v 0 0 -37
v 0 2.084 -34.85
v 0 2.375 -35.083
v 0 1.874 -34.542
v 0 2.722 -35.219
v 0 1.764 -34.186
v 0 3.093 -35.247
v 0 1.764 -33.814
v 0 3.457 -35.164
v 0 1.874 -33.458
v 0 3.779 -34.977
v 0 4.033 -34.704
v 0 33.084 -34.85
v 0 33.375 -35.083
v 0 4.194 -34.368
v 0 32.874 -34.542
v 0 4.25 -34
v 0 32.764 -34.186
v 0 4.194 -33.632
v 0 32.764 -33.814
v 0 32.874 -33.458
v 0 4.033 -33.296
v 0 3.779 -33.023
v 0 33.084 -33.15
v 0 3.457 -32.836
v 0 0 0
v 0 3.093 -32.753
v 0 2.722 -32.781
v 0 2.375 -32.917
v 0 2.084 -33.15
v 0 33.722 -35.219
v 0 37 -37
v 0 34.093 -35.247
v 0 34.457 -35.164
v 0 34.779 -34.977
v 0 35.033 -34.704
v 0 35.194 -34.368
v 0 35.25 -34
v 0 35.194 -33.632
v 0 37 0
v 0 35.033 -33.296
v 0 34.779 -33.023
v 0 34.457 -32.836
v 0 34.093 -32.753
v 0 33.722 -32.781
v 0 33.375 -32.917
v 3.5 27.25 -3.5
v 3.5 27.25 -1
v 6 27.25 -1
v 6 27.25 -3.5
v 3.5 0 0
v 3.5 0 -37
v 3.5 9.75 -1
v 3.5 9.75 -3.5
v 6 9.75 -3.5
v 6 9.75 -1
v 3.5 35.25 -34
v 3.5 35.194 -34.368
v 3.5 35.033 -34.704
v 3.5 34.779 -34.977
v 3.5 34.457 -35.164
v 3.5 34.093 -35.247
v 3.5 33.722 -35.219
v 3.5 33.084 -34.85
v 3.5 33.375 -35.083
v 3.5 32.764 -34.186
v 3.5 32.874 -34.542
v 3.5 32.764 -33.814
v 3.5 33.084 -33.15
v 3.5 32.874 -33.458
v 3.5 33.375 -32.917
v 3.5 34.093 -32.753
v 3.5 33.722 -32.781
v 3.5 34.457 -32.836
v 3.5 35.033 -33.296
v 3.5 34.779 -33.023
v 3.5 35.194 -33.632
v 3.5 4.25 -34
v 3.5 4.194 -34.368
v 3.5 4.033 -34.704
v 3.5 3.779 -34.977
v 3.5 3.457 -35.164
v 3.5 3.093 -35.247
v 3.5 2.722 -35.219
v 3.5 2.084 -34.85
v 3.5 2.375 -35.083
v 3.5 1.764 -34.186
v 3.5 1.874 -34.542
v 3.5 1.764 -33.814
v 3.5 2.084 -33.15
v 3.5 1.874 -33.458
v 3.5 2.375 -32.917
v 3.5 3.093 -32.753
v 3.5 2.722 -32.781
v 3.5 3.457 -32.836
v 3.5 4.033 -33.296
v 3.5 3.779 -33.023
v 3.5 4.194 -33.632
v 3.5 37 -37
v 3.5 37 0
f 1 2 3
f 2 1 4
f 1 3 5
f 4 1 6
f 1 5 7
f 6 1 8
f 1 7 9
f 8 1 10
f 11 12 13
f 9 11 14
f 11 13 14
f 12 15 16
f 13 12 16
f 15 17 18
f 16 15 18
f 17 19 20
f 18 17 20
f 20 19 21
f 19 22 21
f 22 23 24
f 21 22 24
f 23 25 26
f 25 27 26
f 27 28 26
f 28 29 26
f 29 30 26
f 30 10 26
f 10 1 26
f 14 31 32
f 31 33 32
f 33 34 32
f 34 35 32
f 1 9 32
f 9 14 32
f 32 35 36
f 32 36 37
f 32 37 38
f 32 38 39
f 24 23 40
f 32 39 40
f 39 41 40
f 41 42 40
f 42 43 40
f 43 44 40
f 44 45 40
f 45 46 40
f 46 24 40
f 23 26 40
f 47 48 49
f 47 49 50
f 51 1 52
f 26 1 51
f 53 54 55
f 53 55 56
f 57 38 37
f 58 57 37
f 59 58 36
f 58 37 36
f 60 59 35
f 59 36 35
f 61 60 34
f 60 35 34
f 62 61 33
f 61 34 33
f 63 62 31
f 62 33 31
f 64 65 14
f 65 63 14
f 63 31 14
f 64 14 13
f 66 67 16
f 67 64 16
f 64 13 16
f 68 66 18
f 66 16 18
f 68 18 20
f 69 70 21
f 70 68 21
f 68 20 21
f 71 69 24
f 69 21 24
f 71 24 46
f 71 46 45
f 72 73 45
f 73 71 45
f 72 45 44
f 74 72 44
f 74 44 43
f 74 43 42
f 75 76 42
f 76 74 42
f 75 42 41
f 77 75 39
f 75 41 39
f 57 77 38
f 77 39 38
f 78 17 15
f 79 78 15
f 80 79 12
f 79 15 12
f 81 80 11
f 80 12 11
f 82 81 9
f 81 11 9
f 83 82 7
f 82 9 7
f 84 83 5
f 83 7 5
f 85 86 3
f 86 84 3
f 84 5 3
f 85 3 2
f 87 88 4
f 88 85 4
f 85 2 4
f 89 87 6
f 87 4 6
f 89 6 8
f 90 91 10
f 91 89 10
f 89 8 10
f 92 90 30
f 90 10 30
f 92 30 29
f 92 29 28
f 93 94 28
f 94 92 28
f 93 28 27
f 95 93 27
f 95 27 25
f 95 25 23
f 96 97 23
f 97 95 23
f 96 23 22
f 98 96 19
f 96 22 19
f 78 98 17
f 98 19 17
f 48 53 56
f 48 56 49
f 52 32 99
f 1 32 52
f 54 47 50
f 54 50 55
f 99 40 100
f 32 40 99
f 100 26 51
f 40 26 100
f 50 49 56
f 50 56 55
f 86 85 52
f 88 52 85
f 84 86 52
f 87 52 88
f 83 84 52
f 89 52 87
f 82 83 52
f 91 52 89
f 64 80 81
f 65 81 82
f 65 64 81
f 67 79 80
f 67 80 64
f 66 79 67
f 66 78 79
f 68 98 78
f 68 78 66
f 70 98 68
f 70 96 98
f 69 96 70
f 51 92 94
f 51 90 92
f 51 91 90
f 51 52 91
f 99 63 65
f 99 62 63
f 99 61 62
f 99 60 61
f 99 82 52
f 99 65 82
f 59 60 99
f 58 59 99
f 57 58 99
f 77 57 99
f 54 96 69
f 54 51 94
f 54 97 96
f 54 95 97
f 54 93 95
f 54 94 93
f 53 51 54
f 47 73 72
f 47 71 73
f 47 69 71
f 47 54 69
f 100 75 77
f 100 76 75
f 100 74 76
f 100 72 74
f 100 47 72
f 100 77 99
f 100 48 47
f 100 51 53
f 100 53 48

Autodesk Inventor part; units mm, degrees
ref_plane "YZ Plane" through (0, 0, 0) normal (1, 0, 0) x (0, 1, 0)
ref_plane "XZ Plane" through (0, 0, 0) normal (0, 1, 0) x (-1, 0, 0)
ref_plane "XY Plane" through (0, 0, 0) normal (0, 0, 1) x (1, 0, 0)
sketch "Náčrt1" plane through (0, 0, 0) normal (1, 0, 0) x (0, 1, 0)
  line L0 (0, 0) -> (37, 0)
  line L1 (37, 0) -> (37, -37)
  line L2 (37, -37) -> (0, -37)
  line L3 (0, -37) -> (0, 0)
  circle A0 centre (34, -34) radius 1.25
  circle A1 centre (3, -34) radius 1.25
  dimension "d0" = 37
  dimension "d1" = 37
  dimension "d2" = 2.5
  dimension "d3" = 3
  dimension "d4" = 3
  dimension "d5" = 3
extrude "Vysunutí1" add sketch "Náčrt1" along normal blind 3.5
sketch "Náčrt2" plane through (3.5, 0, 0) normal (1, 0, 0) x (0, 0, -1)
  line L0 (1, 27.25) -> (3.5, 27.25)
  line L1 (3.5, 27.25) -> (3.5, 9.75)
  line L2 (3.5, 9.75) -> (1, 9.75)
  line L3 (1, 9.75) -> (1, 27.25)
  line L4 (0, 37) -> (37, 37) projected
  line L5 (0, 37) -> (0, 0) projected
  dimension "d8" = 2.5
  dimension "d9" = 17.5
  dimension "d10" = 9.75
  dimension "d11" = 1
extrude "Vysunutí2" add sketch "Náčrt2" along normal blind 2.5
equation "\"d1\" = d0"
equation "\"d4\" = d3"
equation "\"d5\" = d4"
equation "\"d10\" = -0.5 * d9 + 0.5 * d0"
properties part number "SIM808 Module GSM GPRS GPS Breakout Board SIM808 for Arduino Raspberry"
